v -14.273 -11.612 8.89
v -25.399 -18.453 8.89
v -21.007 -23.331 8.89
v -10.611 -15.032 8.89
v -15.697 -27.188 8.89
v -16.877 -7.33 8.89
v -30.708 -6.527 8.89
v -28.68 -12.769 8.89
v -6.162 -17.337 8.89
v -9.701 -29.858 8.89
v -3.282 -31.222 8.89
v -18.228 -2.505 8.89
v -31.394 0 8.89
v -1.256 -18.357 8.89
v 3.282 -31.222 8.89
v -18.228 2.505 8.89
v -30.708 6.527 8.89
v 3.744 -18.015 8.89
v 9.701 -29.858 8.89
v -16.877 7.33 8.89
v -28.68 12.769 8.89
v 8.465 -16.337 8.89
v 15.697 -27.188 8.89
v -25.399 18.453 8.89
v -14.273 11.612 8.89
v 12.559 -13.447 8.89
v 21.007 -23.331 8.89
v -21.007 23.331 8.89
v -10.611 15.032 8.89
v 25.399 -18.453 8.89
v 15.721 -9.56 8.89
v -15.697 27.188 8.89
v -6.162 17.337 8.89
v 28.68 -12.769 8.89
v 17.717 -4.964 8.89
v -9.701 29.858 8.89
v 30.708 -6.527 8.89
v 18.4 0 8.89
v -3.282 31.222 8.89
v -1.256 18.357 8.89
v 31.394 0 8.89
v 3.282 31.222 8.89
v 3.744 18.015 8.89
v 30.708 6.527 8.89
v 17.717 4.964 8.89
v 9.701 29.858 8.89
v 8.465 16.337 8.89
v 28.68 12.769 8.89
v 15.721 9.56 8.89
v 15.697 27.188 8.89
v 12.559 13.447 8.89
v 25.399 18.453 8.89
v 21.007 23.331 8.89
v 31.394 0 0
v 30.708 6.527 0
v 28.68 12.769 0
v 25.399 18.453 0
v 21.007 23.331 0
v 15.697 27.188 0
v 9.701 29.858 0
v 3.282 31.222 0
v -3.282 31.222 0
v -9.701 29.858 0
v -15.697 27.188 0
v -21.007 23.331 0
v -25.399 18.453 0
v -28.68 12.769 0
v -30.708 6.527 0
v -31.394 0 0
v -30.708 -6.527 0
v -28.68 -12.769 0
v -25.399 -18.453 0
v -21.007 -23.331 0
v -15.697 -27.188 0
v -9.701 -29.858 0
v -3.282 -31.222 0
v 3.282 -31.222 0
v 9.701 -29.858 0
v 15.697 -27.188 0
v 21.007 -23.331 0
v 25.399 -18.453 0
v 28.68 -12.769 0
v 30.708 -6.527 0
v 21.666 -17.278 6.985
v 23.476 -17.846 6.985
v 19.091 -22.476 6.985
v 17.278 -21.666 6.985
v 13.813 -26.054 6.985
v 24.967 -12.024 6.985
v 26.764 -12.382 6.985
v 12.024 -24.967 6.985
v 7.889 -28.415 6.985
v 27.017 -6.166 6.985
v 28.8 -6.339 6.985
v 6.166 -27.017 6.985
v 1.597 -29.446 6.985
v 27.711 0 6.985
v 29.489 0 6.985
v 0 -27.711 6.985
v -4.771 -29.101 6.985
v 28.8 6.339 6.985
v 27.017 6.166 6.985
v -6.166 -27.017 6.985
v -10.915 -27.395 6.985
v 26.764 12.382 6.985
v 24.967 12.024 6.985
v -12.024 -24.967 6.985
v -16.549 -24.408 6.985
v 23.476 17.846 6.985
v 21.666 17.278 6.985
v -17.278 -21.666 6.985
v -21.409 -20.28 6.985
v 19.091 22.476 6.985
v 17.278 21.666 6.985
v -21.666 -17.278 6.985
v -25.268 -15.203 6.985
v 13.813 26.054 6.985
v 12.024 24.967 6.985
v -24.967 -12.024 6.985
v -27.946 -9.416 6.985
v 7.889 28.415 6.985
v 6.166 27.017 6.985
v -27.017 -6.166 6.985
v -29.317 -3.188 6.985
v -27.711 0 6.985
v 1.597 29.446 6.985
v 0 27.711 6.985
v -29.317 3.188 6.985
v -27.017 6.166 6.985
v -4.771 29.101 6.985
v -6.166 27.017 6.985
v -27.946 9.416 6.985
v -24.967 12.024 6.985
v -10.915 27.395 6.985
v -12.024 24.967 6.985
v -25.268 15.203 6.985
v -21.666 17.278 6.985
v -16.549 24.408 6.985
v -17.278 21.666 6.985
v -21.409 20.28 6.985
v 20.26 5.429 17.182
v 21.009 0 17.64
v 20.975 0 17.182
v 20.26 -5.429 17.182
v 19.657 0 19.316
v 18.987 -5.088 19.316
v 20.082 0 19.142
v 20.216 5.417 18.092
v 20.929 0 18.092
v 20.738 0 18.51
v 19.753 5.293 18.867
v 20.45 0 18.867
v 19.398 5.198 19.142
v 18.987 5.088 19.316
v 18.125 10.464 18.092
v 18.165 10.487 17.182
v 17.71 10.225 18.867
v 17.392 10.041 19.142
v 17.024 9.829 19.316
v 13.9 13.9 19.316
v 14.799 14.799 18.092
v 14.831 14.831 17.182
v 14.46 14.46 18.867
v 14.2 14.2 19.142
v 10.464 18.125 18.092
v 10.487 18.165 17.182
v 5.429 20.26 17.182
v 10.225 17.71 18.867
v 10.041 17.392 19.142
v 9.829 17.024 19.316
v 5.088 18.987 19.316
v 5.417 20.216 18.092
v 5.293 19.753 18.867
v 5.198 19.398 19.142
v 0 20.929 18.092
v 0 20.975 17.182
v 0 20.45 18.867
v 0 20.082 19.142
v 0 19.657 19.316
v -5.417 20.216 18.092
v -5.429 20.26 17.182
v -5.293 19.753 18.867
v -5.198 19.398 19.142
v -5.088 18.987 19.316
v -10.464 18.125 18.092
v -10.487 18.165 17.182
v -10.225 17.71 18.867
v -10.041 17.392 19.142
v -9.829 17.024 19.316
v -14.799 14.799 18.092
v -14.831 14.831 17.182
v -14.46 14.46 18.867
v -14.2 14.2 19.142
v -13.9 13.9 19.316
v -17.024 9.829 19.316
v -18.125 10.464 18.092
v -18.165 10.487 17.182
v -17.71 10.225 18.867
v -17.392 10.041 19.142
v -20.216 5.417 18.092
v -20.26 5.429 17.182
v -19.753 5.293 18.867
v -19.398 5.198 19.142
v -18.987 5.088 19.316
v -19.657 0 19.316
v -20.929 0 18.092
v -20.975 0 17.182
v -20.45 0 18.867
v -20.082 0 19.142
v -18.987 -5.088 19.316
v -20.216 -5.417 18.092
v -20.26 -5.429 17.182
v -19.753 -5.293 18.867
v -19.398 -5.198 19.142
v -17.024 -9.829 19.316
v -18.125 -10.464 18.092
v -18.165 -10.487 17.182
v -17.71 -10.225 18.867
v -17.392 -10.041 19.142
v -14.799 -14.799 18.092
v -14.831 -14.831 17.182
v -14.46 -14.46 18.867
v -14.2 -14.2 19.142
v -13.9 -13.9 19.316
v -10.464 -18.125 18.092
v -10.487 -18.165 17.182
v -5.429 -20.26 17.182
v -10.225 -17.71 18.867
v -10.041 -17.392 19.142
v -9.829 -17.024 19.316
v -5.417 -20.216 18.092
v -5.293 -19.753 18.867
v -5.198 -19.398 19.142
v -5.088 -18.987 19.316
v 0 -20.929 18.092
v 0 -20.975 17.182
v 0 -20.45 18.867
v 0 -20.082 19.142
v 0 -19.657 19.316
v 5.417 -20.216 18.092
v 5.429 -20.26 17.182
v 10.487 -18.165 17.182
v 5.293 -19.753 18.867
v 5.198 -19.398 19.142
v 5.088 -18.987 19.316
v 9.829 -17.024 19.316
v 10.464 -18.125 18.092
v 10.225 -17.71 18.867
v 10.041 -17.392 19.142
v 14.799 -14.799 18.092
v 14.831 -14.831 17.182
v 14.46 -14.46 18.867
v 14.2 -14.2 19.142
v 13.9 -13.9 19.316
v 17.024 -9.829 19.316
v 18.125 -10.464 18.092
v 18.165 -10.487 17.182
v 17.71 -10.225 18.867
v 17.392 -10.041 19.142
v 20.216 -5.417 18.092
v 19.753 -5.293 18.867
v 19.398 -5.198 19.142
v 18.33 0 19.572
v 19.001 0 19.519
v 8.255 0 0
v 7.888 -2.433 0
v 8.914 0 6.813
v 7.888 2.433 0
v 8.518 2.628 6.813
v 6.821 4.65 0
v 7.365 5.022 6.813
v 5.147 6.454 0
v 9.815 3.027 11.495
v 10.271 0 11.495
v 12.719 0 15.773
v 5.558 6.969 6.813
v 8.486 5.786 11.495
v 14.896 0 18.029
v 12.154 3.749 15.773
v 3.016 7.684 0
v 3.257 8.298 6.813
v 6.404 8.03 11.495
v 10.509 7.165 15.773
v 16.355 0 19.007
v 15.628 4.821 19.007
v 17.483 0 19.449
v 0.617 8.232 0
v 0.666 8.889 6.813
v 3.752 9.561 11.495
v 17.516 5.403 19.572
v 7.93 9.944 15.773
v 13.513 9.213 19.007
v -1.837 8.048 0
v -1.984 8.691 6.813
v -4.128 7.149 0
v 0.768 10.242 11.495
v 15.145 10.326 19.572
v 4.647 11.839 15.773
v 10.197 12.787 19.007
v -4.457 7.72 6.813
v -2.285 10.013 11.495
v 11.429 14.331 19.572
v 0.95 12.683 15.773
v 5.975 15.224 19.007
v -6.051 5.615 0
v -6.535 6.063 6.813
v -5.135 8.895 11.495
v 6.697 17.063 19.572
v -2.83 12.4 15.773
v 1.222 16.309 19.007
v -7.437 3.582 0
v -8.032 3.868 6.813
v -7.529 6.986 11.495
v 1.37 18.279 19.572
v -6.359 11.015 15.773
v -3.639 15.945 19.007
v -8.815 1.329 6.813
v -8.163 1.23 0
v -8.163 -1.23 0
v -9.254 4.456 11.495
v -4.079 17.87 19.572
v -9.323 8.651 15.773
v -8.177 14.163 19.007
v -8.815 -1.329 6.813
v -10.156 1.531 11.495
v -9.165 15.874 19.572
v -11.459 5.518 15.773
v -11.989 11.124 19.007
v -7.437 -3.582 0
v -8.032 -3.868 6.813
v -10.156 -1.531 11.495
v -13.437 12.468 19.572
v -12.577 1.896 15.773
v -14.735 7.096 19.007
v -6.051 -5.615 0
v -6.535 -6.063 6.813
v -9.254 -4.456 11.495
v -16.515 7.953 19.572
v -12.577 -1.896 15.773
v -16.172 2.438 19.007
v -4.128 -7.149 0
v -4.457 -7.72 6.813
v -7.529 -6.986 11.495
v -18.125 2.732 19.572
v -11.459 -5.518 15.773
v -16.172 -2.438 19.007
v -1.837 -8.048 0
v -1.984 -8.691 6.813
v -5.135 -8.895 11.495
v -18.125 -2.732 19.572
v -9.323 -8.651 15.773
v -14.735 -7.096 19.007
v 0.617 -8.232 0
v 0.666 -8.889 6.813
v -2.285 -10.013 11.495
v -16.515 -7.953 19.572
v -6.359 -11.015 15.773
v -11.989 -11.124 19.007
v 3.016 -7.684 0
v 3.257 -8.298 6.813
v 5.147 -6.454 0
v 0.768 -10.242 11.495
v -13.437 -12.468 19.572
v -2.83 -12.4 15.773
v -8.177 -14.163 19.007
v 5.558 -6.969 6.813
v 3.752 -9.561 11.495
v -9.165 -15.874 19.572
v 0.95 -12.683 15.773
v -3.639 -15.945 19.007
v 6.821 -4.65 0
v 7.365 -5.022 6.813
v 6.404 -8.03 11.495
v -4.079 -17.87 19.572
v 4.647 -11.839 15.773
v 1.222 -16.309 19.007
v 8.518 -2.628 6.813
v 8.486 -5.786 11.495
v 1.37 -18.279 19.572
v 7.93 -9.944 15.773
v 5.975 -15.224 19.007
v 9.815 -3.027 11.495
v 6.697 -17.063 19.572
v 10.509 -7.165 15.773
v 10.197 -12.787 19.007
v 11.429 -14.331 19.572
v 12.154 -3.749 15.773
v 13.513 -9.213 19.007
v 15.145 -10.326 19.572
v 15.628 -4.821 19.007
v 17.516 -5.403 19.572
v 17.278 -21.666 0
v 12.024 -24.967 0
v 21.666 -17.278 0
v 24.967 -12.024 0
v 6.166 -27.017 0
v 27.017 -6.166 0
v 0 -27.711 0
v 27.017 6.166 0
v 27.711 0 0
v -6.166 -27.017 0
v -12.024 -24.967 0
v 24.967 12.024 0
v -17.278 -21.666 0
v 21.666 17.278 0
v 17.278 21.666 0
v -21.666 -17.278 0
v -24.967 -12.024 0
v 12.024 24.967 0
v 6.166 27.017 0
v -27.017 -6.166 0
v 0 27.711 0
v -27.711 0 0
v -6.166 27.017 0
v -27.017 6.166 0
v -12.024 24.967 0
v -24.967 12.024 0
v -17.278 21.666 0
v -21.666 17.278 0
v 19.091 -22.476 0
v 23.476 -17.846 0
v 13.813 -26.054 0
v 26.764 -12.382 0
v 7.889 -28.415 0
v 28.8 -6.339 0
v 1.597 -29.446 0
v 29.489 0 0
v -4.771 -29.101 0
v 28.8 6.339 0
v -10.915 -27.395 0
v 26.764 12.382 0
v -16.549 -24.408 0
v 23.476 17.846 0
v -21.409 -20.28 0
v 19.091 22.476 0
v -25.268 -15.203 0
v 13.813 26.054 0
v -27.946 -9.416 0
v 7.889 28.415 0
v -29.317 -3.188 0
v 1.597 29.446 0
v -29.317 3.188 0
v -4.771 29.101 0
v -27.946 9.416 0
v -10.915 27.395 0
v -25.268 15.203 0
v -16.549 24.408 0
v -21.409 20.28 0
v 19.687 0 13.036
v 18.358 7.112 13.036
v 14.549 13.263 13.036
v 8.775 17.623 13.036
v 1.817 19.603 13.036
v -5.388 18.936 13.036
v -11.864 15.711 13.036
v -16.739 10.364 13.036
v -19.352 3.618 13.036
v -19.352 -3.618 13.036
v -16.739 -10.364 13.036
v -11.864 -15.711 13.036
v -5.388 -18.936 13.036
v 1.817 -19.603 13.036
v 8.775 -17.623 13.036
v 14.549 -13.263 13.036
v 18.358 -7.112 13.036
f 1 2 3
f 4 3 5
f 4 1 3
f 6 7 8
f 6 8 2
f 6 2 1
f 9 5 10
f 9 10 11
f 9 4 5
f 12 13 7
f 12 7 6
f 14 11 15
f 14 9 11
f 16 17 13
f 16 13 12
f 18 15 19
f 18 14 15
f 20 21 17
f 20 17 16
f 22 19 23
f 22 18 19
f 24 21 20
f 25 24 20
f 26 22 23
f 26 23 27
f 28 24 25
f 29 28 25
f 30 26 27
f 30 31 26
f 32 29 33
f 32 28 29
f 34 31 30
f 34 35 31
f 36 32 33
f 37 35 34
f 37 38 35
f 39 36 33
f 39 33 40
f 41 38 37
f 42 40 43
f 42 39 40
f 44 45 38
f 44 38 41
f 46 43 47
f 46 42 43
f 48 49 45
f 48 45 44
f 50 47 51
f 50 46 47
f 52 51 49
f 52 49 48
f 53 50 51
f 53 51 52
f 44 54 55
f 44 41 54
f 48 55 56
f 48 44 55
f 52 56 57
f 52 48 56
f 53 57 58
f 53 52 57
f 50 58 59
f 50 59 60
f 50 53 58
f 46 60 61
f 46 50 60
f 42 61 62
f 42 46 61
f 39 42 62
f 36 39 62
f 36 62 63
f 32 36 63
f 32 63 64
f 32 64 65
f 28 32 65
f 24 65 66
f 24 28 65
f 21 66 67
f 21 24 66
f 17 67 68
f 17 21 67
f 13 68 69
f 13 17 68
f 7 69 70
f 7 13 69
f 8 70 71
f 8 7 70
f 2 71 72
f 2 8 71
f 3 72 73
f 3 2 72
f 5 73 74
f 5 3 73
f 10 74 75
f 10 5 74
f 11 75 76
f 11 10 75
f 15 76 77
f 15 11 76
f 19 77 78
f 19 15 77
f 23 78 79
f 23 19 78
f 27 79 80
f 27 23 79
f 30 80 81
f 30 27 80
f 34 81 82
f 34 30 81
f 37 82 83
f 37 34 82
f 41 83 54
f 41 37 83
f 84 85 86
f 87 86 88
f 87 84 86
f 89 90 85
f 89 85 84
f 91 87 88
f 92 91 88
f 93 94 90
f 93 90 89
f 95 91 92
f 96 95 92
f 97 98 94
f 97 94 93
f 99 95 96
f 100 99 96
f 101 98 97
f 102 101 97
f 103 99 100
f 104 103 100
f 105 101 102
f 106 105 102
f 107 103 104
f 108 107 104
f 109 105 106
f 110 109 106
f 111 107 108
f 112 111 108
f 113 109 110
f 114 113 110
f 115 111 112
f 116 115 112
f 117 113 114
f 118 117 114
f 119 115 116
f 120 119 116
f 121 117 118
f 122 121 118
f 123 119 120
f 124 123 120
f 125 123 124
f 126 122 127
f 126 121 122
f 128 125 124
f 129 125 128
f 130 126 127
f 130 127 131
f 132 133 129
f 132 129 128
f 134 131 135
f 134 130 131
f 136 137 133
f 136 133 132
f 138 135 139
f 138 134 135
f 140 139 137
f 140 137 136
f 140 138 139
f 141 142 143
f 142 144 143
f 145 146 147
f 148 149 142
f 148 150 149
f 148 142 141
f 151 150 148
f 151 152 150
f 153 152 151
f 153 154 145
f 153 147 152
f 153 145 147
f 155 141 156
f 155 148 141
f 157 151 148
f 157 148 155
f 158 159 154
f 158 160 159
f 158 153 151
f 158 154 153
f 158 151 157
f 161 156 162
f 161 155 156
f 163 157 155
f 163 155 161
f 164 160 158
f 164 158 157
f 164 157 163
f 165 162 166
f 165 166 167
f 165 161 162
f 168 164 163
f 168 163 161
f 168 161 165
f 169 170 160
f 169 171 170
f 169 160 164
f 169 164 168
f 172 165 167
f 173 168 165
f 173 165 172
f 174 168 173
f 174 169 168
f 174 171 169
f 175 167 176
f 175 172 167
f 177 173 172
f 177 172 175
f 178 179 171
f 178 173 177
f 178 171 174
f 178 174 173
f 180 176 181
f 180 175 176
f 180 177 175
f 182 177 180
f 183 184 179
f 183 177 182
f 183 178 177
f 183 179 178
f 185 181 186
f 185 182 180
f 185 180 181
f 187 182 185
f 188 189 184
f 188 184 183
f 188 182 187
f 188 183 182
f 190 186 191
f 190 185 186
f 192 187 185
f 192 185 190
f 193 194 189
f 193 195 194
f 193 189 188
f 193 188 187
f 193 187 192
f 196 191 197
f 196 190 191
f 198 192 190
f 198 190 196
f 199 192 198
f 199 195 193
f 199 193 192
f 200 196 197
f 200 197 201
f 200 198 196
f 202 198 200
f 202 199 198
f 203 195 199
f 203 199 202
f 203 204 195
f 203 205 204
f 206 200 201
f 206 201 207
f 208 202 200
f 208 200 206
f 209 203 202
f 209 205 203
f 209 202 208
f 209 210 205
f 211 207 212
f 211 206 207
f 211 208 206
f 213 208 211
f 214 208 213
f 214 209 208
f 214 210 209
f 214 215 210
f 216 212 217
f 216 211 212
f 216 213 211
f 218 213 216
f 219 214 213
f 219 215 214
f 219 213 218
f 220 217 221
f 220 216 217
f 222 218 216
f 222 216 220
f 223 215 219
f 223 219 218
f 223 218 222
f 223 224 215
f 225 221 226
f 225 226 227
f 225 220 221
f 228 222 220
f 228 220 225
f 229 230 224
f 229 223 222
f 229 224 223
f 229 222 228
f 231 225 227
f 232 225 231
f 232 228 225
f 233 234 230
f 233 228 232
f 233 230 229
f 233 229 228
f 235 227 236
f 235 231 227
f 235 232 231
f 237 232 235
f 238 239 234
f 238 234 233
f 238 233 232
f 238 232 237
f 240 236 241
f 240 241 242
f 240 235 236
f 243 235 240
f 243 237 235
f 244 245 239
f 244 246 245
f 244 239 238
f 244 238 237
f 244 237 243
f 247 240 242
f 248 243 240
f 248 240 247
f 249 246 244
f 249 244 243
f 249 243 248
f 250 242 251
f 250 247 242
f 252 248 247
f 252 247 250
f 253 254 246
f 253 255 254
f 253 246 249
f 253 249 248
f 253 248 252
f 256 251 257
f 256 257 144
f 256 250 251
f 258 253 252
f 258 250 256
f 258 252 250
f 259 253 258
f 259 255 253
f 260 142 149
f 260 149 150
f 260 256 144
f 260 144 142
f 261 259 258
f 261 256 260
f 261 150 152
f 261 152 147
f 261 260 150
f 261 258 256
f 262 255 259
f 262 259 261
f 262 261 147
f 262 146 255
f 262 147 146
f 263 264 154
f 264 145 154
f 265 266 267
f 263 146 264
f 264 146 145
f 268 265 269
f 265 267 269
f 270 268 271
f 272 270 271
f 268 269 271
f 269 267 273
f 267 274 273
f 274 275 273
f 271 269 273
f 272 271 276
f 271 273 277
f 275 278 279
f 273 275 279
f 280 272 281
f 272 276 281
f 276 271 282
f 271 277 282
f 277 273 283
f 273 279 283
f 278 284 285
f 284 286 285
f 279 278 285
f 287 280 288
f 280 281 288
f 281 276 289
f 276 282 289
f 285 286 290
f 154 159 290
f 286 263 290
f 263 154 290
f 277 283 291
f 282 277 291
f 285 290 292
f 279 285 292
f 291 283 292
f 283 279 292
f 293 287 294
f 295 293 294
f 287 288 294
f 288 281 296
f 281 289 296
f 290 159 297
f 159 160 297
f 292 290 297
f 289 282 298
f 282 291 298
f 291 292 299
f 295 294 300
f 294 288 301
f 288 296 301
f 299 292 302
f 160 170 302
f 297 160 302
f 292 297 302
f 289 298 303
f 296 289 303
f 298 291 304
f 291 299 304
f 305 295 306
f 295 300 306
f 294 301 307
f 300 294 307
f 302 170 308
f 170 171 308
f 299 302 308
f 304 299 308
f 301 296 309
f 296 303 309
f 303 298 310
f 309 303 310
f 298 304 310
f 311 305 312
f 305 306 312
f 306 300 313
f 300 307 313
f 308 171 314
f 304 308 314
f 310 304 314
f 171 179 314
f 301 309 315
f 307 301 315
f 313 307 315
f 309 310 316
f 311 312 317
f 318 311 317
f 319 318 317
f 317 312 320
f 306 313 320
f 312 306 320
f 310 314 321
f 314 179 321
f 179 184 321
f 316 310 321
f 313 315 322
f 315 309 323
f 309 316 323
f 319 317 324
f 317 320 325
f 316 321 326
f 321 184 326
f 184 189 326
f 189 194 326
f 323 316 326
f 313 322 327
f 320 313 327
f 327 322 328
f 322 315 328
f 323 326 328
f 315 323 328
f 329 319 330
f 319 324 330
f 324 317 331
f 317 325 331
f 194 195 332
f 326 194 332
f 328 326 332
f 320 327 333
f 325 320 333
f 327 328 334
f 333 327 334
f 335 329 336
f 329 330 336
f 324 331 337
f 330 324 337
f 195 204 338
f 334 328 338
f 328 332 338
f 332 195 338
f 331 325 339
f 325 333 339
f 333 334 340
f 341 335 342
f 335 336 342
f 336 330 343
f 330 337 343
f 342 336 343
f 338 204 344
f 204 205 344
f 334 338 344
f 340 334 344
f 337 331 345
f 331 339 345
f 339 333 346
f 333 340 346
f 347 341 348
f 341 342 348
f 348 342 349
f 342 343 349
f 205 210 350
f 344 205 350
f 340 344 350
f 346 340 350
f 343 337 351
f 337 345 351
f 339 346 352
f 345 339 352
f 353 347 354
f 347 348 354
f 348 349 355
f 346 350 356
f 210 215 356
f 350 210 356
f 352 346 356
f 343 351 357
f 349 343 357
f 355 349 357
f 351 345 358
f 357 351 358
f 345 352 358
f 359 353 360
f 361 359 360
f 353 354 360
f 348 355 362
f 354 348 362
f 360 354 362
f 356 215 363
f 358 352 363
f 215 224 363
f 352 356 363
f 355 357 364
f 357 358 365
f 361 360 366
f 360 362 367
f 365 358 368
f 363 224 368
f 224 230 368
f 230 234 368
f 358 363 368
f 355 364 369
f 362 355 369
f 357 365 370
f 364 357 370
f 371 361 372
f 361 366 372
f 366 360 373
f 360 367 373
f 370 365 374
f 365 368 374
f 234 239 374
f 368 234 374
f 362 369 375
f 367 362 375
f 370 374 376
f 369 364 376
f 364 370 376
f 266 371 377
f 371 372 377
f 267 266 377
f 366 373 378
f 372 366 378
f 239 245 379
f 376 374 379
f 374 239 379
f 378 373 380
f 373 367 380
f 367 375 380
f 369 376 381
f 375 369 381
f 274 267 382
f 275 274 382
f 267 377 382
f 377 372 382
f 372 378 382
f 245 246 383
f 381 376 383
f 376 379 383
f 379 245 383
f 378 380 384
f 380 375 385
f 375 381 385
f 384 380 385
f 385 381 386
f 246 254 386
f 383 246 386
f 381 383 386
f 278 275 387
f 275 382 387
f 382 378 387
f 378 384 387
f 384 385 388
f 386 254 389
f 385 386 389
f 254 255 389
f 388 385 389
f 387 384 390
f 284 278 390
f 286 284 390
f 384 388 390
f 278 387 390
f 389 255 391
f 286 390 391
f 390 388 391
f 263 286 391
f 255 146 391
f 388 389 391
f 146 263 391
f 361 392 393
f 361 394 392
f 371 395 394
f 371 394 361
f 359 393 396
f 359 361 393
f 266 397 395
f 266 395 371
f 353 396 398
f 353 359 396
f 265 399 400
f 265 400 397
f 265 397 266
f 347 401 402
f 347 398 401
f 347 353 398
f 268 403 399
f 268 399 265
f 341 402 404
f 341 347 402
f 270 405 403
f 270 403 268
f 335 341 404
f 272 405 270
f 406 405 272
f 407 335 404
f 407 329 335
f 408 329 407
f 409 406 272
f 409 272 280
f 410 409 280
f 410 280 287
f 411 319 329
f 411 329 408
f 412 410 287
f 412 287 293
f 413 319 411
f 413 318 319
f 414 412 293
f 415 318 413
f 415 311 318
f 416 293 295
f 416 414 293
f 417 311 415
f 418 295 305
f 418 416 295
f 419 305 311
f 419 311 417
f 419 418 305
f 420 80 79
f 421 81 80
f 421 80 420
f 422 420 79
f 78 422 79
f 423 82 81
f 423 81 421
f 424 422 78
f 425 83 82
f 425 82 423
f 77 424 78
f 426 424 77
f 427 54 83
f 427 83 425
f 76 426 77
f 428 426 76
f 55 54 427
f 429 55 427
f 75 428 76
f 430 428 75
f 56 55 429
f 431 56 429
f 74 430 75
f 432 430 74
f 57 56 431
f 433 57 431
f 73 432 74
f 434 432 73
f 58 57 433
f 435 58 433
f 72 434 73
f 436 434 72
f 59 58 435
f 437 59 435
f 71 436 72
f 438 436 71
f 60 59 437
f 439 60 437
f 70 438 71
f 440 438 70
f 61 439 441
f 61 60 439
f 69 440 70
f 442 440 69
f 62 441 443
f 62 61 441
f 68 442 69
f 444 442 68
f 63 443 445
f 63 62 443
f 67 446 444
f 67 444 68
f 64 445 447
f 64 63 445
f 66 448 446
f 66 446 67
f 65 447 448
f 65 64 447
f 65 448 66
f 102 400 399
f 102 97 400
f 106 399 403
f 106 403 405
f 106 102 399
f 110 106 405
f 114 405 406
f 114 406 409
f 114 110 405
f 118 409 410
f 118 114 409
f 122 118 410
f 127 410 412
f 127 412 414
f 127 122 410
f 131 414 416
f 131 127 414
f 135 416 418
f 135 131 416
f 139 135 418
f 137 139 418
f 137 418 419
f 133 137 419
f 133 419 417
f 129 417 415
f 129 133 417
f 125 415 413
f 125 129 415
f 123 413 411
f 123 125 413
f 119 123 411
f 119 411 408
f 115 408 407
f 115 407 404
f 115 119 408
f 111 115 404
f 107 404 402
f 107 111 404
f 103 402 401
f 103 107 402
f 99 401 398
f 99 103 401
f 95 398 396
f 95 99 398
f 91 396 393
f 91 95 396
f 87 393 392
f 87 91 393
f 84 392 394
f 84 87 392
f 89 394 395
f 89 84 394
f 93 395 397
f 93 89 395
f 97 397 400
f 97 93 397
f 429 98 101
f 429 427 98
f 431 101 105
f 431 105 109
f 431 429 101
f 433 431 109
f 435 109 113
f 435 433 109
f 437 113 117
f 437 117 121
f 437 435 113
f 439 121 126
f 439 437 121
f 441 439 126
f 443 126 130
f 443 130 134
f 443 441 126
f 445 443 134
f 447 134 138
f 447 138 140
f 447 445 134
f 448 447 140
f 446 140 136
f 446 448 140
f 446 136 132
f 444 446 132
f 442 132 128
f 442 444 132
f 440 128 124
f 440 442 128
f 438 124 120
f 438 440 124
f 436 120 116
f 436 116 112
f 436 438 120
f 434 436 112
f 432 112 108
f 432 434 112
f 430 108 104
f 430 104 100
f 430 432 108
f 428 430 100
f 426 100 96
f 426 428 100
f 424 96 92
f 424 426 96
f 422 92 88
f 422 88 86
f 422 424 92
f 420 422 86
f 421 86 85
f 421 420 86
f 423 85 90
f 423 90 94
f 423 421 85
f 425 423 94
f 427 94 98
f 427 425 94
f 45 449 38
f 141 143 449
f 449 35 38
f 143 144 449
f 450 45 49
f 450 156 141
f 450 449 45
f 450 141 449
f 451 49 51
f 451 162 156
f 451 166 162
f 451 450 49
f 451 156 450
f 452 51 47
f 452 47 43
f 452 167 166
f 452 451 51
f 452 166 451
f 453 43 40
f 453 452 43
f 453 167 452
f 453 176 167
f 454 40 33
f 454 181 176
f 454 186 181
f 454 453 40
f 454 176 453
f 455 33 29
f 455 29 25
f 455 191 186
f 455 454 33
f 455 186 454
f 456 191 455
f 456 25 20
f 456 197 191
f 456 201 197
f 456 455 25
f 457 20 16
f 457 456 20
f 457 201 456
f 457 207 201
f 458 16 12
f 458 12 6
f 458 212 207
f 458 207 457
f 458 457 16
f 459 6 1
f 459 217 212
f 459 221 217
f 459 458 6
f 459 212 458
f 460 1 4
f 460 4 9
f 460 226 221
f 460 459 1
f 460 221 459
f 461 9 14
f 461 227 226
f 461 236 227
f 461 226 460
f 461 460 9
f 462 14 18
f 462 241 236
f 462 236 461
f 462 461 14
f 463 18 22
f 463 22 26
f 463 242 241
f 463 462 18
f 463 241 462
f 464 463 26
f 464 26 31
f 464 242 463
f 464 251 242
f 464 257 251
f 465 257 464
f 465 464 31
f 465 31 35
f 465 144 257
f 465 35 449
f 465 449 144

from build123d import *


with BuildPart() as f1:
    # F0 (on Front) → F1 (revolve)
    with BuildSketch(Plane.XZ):
        with BuildLine():
            add(Edge.make_bspline(
                [(8.255, 0), (8.2216796153, 2.3076537954), (8.8350885951, 8.5271520648), (12.1501012783, 16.3709643576), (17.4859554214, 20.2662519854), (19.6571610868, 19.3162634969)],
                knots=[0, 0, 0, 0, 0.3357963175, 0.6868837016, 1, 1, 1, 1], degree=3))
            Line((8.255, 0), (27.7114, 0))
            Line((27.7114, 0), (27.7114, 6.985))
            Line((27.7114, 6.985), (29.4894, 6.985))
            Line((29.4894, 6.985), (29.4894, 0))
            Line((29.4894, 0), (31.3944, 0))
            Line((31.3944, 0), (31.3944, 8.89))
            Line((31.3944, 8.89), (18.3997968841, 8.89))
            Line((18.3997968841, 8.89), (20.9748614579, 17.1817578375))
            ThreePointArc((20.9748614579, 17.1817578375), (20.7383933614, 18.509760988), (19.6571610868, 19.3162634969))
        make_face()
    revolve(axis=Axis((0, 0, 8.4439804778), (0, 0, 1)))


solid = f1.part
